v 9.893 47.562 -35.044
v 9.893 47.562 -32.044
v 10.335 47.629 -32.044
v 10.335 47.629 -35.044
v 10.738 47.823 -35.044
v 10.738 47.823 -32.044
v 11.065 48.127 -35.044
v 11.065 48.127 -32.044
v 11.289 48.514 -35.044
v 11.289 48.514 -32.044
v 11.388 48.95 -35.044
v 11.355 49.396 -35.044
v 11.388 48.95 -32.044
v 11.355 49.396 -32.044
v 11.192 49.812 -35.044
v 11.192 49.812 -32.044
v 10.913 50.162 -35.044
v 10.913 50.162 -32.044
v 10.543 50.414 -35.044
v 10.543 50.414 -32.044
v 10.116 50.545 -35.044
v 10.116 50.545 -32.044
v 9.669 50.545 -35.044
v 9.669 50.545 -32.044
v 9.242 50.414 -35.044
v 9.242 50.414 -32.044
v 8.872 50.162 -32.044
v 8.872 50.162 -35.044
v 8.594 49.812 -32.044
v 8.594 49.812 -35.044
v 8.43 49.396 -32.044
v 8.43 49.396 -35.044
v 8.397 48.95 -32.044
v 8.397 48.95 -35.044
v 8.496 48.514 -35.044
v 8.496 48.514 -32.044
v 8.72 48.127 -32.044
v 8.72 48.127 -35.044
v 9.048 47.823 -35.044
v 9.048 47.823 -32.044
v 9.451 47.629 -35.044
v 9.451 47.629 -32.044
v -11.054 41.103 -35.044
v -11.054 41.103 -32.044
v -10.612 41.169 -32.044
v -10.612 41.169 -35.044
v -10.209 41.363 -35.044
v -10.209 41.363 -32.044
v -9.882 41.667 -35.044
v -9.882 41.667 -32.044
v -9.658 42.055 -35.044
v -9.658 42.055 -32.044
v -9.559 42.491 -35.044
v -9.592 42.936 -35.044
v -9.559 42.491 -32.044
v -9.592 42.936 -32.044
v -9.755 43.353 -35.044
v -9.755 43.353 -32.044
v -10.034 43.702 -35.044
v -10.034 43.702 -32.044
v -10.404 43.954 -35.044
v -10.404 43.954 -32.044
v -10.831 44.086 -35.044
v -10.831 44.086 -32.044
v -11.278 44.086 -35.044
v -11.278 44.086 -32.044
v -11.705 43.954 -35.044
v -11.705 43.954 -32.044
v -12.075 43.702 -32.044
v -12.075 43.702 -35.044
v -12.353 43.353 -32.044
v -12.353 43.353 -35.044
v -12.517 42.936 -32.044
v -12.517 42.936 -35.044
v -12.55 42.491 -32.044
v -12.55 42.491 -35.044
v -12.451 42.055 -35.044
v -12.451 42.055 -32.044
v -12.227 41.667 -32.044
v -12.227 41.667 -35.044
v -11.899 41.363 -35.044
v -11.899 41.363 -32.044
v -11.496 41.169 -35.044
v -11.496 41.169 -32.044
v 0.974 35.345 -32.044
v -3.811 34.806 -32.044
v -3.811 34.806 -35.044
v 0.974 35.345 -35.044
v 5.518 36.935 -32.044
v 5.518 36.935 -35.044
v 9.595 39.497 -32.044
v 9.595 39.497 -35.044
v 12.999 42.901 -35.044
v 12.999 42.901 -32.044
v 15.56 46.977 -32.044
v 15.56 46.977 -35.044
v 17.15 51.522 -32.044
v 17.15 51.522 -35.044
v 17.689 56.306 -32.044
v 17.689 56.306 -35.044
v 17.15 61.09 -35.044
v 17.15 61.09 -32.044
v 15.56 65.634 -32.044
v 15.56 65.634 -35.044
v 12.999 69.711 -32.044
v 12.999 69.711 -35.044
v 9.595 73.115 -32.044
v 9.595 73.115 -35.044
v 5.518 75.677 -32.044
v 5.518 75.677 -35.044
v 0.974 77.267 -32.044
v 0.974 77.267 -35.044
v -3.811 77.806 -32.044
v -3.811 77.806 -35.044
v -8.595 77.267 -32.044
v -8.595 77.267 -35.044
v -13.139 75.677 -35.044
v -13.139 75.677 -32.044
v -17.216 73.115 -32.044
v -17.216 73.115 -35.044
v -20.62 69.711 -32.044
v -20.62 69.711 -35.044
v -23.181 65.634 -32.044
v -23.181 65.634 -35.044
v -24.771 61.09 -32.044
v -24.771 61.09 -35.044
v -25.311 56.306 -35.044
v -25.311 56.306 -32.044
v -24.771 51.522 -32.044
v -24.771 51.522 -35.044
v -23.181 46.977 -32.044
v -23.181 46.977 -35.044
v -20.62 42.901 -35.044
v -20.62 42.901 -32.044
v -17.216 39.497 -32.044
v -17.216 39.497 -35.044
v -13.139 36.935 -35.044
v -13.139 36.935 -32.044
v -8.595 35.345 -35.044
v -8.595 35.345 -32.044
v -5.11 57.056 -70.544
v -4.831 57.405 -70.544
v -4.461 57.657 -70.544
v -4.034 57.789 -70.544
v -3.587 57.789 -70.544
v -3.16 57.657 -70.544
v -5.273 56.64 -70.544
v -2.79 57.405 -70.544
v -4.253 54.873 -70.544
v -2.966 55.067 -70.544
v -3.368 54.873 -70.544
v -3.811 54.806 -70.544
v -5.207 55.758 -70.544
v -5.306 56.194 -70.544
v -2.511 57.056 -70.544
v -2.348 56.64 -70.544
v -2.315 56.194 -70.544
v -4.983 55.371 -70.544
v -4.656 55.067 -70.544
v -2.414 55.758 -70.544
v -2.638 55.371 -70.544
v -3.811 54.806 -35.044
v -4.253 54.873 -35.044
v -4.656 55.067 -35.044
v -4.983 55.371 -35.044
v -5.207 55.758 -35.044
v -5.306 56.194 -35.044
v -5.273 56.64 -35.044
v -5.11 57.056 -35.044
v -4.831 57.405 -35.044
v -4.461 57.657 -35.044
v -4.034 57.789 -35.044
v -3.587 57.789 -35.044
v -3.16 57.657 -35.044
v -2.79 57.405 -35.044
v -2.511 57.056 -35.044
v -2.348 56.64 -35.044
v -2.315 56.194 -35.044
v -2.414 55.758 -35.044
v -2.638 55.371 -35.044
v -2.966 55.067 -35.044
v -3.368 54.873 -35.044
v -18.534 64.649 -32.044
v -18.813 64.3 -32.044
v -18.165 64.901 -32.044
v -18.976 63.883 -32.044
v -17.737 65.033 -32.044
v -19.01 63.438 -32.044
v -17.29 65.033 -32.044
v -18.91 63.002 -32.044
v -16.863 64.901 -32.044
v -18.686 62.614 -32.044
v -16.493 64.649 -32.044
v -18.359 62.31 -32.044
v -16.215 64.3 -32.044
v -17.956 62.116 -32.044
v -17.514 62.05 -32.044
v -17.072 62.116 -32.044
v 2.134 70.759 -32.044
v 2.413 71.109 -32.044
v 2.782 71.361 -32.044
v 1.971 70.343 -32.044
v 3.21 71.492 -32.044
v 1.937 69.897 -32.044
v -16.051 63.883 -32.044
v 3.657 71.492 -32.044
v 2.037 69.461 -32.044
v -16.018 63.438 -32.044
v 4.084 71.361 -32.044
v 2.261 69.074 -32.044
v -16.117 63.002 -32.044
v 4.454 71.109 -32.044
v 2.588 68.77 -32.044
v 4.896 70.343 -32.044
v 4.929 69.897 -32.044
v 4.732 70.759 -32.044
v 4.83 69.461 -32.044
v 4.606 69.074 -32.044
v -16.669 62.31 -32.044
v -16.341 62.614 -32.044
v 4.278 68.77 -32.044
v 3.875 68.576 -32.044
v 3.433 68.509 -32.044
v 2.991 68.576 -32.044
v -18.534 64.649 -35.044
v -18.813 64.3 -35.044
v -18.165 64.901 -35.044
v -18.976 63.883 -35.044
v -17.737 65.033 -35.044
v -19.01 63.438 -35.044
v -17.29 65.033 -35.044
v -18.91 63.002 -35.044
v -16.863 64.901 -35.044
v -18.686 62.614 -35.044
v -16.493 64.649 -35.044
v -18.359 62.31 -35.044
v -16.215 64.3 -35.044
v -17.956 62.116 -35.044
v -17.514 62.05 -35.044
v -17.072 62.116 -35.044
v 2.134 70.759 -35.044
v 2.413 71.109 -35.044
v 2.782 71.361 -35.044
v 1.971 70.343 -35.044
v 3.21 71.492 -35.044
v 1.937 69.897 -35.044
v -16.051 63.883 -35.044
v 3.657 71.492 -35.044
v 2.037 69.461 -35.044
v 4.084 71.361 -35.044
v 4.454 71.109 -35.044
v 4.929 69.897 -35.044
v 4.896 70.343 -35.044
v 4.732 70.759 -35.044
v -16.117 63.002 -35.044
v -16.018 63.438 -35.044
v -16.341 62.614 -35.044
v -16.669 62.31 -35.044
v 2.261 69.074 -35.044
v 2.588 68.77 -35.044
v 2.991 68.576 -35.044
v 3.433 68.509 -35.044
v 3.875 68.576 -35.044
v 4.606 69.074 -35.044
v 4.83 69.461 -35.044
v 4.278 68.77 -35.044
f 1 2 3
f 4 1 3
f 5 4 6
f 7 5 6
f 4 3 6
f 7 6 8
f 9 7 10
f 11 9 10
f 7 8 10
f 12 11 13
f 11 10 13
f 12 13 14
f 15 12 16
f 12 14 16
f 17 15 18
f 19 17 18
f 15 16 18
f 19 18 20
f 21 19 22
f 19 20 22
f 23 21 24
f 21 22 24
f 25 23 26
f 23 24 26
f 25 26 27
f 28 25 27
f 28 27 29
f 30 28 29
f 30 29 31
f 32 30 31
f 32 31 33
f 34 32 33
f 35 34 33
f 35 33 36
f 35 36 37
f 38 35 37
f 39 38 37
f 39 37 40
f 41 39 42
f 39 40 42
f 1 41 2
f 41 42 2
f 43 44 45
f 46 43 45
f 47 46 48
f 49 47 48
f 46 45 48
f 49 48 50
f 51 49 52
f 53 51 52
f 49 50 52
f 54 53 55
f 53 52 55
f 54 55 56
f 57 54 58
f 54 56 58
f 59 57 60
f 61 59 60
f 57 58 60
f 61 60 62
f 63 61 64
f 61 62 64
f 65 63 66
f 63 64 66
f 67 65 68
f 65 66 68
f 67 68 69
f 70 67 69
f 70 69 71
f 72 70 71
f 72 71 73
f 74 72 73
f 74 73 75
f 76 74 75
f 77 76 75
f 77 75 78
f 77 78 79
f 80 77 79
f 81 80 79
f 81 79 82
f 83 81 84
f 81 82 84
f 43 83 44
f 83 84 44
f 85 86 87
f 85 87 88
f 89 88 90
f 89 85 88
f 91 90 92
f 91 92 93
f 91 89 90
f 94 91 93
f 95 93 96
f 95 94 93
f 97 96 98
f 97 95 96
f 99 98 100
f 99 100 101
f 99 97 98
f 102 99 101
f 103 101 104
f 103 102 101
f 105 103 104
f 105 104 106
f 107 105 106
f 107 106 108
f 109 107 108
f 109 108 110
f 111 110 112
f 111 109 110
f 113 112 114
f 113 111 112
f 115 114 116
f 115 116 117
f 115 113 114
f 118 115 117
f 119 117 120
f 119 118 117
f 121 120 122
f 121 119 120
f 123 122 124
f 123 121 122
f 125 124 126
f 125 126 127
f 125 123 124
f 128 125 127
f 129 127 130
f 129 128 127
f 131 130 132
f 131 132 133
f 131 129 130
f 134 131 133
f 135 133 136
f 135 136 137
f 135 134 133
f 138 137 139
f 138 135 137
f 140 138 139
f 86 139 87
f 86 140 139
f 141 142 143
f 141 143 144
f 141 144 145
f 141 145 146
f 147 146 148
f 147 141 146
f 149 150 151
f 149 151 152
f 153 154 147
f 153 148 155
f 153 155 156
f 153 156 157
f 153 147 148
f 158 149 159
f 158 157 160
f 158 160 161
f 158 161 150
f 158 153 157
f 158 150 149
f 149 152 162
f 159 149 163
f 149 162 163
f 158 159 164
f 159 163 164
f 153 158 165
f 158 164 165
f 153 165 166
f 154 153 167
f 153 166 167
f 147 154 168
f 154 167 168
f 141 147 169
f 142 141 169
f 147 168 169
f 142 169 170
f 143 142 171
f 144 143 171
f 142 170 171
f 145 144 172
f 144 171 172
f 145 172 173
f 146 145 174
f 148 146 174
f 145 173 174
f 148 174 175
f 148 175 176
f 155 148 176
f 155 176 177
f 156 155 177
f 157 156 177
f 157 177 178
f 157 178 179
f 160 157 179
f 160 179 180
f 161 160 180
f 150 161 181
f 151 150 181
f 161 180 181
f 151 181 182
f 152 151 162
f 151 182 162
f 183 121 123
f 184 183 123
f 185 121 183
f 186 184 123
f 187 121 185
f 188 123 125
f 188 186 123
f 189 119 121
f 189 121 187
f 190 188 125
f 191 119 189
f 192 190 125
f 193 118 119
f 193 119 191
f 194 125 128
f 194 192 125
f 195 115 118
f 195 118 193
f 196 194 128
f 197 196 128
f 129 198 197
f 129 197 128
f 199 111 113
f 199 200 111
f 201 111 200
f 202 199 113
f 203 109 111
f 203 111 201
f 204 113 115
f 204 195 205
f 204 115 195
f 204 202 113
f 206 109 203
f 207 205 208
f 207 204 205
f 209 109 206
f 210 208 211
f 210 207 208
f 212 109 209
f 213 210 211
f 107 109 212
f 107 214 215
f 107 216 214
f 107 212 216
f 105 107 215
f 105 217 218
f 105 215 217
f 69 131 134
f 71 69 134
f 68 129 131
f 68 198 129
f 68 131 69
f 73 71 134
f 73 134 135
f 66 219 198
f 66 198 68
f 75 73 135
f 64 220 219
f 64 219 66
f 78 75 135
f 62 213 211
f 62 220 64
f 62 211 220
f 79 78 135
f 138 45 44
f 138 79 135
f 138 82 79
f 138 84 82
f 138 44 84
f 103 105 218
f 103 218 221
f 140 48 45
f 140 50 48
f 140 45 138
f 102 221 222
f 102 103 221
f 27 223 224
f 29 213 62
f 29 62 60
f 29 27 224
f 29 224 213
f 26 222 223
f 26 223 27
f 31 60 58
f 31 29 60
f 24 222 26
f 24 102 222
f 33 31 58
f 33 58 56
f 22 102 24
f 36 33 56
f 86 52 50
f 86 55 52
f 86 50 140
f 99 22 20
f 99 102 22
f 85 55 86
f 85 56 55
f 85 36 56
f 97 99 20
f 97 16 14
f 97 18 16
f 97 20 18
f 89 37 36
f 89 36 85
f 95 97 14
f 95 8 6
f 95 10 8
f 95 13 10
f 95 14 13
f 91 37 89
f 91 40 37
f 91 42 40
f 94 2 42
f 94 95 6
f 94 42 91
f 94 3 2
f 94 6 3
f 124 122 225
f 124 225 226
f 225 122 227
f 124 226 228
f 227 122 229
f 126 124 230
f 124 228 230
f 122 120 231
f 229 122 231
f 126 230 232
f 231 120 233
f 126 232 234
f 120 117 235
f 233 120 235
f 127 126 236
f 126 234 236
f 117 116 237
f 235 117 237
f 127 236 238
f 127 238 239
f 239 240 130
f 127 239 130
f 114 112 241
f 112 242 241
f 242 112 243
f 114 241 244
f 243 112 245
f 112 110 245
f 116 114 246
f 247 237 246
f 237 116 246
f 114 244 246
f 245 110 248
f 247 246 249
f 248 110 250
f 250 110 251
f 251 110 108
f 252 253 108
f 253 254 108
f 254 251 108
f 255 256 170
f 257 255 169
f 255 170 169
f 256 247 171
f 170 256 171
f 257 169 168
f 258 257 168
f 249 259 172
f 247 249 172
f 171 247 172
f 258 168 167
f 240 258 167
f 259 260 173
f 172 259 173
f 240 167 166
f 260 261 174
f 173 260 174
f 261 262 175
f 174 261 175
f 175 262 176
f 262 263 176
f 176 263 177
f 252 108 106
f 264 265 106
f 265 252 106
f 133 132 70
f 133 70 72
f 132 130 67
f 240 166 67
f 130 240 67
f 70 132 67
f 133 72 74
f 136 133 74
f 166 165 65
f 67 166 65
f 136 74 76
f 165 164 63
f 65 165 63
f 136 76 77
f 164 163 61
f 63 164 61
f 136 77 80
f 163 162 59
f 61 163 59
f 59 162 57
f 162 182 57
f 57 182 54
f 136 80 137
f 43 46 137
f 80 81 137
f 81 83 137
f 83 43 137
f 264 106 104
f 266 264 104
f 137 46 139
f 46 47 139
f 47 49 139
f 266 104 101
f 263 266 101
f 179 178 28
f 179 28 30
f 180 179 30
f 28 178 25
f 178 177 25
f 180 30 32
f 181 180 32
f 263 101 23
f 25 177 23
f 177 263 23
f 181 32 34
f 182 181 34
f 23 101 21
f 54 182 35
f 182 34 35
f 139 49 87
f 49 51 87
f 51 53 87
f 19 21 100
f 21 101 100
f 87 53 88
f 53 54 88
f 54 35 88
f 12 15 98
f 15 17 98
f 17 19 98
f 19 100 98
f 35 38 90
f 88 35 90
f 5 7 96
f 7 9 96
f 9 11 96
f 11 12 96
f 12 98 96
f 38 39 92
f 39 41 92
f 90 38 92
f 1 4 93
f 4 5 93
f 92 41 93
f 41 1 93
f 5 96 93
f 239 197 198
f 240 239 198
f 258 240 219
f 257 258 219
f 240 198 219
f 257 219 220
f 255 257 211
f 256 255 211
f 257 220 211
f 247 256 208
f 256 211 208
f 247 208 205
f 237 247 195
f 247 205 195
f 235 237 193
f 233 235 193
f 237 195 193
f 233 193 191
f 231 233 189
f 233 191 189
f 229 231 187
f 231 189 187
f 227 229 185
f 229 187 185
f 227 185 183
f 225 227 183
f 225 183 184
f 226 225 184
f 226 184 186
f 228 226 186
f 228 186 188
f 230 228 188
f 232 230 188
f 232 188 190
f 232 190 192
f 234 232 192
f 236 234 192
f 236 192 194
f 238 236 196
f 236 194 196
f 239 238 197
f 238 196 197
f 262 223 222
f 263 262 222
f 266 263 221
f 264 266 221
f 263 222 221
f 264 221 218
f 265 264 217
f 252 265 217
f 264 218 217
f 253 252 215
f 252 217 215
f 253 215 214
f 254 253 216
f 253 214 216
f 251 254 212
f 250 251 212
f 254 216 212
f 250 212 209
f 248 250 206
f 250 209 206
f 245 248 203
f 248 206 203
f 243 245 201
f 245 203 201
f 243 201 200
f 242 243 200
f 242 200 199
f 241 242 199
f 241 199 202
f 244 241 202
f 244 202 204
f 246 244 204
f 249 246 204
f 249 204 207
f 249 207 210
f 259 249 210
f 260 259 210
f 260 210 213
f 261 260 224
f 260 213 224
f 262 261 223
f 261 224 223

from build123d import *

# Parameters (mm, degrees)
SKETCH2_R           = 21.5
SKETCH2_R_2         = 1.5
BOSS_EXTRUDE1_DEPTH = 3
SKETCH4_R           = 1.5
BOSS_EXTRUDE3_DEPTH = 35.5


with BuildPart() as part:
    # Sketch2 → Boss-Extrude1 (new body)
    with BuildSketch(Plane(origin=(-3.810522997, 56.305896335, -32.044001089), x_dir=(-0.4673428599090645, -0.8840761569525651, 0), z_dir=(0, 0, 1))):
        with Locations(Location((0, 0, 0), (0, 0, 27.861953602))):
            Circle(SKETCH2_R)
        with Locations(Location((0, 15.5, 0), (0, 0, 27.861953602))):
            Circle(SKETCH2_R_2, mode=Mode.SUBTRACT)
        with Locations(Location((15.5, 0, 0), (0, 0, 27.861953602))):
            Circle(SKETCH2_R_2, mode=Mode.SUBTRACT)
        with Locations(Location((0, -15.5, 0), (0, 0, 27.861953602))):
            Circle(SKETCH2_R_2, mode=Mode.SUBTRACT)
        with Locations(Location((-15.5, 0, 0), (0, 0, 27.861953602))):
            Circle(SKETCH2_R_2, mode=Mode.SUBTRACT)
    extrude(amount=-BOSS_EXTRUDE1_DEPTH)

    # Sketch4 → Boss-Extrude3 (add)
    with BuildSketch(Plane(origin=(0, 0, -35.044001089), x_dir=(-1, 0, 0), z_dir=(0, 0, -1))):
        with Locations(Location((3.810522997, 56.305896335, 0), (0, 0, 270))):
            Circle(SKETCH4_R)
    extrude(amount=BOSS_EXTRUDE3_DEPTH)


solid = part.part
